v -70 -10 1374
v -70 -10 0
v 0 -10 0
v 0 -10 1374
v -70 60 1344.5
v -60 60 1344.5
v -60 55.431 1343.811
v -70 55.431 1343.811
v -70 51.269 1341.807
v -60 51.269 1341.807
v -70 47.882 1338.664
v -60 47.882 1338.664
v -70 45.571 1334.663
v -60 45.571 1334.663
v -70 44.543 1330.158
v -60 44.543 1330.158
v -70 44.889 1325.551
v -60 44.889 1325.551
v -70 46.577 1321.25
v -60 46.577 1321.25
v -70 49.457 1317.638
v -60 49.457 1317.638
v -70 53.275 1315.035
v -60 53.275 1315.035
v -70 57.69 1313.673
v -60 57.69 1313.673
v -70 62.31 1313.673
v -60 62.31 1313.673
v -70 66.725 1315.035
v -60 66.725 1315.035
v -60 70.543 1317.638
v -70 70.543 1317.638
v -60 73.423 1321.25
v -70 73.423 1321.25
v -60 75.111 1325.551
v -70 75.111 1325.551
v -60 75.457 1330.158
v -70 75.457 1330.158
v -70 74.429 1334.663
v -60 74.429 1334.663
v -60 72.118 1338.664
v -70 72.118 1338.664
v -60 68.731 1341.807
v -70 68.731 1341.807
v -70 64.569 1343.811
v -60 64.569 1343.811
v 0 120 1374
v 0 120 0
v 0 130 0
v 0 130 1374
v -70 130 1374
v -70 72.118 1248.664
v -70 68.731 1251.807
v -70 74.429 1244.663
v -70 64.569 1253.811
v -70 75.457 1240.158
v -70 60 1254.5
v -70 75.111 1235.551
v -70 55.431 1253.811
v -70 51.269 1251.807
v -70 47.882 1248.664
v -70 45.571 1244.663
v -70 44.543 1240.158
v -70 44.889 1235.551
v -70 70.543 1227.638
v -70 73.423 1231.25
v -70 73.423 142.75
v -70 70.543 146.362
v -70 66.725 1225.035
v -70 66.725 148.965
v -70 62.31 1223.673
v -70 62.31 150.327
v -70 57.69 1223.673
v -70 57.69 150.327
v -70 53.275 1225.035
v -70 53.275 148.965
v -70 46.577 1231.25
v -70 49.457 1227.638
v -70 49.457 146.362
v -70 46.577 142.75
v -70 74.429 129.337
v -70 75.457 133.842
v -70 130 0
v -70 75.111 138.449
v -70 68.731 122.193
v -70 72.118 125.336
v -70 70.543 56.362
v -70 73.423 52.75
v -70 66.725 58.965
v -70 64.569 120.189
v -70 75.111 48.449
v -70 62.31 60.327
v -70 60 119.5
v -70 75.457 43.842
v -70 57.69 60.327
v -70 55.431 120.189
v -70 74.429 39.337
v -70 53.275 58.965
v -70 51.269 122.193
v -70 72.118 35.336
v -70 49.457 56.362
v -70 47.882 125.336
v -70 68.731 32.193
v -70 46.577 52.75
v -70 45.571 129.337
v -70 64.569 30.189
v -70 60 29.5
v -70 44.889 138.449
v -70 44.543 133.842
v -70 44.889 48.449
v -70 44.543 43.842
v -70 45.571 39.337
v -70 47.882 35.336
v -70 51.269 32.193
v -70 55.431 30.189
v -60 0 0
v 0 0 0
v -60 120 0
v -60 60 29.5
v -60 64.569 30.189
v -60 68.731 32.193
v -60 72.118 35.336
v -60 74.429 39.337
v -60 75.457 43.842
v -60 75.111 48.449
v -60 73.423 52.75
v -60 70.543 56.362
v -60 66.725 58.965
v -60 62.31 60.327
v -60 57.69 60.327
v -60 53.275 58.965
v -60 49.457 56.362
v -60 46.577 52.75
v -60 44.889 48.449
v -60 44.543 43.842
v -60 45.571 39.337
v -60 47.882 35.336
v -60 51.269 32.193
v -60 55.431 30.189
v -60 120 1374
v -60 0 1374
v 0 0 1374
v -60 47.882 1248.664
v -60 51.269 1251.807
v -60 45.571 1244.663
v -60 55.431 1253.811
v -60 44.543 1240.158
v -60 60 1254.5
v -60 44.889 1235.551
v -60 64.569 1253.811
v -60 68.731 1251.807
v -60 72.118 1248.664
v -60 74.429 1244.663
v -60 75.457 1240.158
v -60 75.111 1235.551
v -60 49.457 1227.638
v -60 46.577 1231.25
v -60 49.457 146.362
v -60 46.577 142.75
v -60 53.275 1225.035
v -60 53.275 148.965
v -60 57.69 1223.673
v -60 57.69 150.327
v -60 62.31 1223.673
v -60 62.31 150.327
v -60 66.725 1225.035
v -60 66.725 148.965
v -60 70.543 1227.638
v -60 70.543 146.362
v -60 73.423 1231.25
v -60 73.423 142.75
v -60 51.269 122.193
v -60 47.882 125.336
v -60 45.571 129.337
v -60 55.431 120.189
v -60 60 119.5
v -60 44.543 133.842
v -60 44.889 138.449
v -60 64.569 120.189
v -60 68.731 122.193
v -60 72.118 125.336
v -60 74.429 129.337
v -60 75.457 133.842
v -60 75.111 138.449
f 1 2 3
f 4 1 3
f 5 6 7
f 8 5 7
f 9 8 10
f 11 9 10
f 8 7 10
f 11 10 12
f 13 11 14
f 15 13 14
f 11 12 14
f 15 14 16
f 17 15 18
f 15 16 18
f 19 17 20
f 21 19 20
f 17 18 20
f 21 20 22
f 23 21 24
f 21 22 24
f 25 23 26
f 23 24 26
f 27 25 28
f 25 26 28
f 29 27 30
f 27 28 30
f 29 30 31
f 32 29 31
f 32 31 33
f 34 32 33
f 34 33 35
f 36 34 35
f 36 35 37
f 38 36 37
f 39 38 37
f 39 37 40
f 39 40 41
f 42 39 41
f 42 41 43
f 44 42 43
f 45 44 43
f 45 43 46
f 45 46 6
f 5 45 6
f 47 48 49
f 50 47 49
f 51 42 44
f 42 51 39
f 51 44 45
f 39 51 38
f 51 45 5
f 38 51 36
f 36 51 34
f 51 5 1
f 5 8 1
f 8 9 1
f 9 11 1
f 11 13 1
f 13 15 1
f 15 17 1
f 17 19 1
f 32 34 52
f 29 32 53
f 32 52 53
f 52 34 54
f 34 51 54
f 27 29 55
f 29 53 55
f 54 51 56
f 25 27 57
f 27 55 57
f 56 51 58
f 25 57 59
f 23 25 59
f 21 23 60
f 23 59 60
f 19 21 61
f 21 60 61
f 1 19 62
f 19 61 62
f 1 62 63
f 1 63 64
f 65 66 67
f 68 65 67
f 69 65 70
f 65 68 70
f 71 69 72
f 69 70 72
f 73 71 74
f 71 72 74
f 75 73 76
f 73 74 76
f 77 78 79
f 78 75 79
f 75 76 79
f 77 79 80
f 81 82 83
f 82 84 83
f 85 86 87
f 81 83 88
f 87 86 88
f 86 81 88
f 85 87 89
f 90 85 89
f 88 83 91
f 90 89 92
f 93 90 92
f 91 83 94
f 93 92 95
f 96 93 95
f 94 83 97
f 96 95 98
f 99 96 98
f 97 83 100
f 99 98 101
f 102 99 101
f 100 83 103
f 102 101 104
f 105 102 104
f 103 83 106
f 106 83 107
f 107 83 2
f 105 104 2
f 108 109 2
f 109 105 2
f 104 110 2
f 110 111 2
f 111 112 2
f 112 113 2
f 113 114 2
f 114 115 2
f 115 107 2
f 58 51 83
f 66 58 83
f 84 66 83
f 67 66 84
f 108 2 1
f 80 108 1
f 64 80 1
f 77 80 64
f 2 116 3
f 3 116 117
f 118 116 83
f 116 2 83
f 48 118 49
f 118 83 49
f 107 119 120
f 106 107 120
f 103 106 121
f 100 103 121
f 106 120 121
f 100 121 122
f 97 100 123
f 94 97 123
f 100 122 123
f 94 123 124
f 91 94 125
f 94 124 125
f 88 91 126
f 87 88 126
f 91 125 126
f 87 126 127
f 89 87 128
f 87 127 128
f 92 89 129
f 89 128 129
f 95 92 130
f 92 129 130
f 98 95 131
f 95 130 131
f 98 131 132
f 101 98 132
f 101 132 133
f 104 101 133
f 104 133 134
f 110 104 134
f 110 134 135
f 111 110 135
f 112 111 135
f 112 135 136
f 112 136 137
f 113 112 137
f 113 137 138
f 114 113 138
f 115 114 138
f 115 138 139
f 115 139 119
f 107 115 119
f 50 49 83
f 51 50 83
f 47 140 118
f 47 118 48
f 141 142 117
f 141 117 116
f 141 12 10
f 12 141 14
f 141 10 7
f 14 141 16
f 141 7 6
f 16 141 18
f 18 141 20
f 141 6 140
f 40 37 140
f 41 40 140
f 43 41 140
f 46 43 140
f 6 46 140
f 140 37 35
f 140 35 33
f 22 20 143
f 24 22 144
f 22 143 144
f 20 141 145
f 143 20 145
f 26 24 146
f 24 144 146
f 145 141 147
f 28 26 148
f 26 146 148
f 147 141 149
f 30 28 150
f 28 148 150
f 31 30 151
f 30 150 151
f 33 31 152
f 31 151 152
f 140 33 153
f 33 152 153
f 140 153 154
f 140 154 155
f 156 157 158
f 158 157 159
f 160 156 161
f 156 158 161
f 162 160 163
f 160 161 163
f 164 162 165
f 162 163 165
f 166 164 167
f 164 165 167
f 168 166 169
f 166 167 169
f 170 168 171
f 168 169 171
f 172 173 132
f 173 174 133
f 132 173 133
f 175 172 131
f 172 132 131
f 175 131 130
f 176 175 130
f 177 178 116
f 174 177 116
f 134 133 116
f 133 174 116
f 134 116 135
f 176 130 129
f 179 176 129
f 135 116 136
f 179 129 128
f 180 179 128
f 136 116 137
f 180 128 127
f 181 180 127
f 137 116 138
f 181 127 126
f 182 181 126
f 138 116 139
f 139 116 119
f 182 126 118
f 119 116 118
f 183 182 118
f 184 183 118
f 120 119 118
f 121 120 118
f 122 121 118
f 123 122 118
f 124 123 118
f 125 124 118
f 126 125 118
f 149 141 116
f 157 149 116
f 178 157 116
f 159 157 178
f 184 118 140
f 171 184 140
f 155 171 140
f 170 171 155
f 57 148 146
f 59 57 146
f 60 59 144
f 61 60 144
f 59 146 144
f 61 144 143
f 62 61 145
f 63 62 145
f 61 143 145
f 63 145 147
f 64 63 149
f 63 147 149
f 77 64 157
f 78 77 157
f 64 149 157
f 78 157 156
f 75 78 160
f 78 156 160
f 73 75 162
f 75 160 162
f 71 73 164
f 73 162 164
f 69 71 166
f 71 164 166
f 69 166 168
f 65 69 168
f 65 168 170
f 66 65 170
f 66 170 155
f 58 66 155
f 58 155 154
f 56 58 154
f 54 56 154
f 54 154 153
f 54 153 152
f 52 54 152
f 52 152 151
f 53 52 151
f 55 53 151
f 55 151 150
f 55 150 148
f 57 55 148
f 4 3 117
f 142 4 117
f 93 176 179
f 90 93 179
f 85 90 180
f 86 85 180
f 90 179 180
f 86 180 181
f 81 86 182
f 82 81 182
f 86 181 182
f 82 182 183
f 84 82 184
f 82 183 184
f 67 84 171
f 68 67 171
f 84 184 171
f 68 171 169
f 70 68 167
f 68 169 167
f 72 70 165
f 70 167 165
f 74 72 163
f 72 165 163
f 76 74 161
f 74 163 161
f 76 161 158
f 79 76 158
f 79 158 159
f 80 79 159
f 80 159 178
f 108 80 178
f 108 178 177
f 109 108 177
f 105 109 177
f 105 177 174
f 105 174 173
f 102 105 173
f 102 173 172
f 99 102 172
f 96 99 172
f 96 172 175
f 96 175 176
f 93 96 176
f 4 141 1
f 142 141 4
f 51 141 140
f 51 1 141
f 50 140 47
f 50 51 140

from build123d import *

# Parameters (mm, degrees)
EXTRUDE_3_DEPTH      = 1374
SKETCH_10_R          = 15.5
CUT_EXTRUDE_11_DEPTH = 1382.439828585


with BuildPart() as part:
    # 草图1 → 拉伸3 (new body)
    with BuildSketch(Plane.XY):
        Polygon((0, 0), (-60, 0), (-60, 120), (0, 120), (0, 130), (-70, 130), (-70, -10), (0, -10), align=None)
    extrude(amount=EXTRUDE_3_DEPTH)

    # 草图10 → 拉伸11 (cut, through all)
    with BuildSketch(Plane(origin=(-60, 0, 0), x_dir=(0, 0, -1), z_dir=(1, 0, 0))):
        with Locations((-45, 60)):
            Circle(SKETCH_10_R)
        with Locations((-135, 60)):
            Circle(SKETCH_10_R)
        with Locations(Location((-1239, 60, 0), (0, 0, 180))):
            Circle(SKETCH_10_R)
        with Locations(Location((-1329, 60, 0), (0, 0, 180))):
            Circle(SKETCH_10_R)
    extrude(amount=-CUT_EXTRUDE_11_DEPTH, mode=Mode.SUBTRACT)


solid = part.part
